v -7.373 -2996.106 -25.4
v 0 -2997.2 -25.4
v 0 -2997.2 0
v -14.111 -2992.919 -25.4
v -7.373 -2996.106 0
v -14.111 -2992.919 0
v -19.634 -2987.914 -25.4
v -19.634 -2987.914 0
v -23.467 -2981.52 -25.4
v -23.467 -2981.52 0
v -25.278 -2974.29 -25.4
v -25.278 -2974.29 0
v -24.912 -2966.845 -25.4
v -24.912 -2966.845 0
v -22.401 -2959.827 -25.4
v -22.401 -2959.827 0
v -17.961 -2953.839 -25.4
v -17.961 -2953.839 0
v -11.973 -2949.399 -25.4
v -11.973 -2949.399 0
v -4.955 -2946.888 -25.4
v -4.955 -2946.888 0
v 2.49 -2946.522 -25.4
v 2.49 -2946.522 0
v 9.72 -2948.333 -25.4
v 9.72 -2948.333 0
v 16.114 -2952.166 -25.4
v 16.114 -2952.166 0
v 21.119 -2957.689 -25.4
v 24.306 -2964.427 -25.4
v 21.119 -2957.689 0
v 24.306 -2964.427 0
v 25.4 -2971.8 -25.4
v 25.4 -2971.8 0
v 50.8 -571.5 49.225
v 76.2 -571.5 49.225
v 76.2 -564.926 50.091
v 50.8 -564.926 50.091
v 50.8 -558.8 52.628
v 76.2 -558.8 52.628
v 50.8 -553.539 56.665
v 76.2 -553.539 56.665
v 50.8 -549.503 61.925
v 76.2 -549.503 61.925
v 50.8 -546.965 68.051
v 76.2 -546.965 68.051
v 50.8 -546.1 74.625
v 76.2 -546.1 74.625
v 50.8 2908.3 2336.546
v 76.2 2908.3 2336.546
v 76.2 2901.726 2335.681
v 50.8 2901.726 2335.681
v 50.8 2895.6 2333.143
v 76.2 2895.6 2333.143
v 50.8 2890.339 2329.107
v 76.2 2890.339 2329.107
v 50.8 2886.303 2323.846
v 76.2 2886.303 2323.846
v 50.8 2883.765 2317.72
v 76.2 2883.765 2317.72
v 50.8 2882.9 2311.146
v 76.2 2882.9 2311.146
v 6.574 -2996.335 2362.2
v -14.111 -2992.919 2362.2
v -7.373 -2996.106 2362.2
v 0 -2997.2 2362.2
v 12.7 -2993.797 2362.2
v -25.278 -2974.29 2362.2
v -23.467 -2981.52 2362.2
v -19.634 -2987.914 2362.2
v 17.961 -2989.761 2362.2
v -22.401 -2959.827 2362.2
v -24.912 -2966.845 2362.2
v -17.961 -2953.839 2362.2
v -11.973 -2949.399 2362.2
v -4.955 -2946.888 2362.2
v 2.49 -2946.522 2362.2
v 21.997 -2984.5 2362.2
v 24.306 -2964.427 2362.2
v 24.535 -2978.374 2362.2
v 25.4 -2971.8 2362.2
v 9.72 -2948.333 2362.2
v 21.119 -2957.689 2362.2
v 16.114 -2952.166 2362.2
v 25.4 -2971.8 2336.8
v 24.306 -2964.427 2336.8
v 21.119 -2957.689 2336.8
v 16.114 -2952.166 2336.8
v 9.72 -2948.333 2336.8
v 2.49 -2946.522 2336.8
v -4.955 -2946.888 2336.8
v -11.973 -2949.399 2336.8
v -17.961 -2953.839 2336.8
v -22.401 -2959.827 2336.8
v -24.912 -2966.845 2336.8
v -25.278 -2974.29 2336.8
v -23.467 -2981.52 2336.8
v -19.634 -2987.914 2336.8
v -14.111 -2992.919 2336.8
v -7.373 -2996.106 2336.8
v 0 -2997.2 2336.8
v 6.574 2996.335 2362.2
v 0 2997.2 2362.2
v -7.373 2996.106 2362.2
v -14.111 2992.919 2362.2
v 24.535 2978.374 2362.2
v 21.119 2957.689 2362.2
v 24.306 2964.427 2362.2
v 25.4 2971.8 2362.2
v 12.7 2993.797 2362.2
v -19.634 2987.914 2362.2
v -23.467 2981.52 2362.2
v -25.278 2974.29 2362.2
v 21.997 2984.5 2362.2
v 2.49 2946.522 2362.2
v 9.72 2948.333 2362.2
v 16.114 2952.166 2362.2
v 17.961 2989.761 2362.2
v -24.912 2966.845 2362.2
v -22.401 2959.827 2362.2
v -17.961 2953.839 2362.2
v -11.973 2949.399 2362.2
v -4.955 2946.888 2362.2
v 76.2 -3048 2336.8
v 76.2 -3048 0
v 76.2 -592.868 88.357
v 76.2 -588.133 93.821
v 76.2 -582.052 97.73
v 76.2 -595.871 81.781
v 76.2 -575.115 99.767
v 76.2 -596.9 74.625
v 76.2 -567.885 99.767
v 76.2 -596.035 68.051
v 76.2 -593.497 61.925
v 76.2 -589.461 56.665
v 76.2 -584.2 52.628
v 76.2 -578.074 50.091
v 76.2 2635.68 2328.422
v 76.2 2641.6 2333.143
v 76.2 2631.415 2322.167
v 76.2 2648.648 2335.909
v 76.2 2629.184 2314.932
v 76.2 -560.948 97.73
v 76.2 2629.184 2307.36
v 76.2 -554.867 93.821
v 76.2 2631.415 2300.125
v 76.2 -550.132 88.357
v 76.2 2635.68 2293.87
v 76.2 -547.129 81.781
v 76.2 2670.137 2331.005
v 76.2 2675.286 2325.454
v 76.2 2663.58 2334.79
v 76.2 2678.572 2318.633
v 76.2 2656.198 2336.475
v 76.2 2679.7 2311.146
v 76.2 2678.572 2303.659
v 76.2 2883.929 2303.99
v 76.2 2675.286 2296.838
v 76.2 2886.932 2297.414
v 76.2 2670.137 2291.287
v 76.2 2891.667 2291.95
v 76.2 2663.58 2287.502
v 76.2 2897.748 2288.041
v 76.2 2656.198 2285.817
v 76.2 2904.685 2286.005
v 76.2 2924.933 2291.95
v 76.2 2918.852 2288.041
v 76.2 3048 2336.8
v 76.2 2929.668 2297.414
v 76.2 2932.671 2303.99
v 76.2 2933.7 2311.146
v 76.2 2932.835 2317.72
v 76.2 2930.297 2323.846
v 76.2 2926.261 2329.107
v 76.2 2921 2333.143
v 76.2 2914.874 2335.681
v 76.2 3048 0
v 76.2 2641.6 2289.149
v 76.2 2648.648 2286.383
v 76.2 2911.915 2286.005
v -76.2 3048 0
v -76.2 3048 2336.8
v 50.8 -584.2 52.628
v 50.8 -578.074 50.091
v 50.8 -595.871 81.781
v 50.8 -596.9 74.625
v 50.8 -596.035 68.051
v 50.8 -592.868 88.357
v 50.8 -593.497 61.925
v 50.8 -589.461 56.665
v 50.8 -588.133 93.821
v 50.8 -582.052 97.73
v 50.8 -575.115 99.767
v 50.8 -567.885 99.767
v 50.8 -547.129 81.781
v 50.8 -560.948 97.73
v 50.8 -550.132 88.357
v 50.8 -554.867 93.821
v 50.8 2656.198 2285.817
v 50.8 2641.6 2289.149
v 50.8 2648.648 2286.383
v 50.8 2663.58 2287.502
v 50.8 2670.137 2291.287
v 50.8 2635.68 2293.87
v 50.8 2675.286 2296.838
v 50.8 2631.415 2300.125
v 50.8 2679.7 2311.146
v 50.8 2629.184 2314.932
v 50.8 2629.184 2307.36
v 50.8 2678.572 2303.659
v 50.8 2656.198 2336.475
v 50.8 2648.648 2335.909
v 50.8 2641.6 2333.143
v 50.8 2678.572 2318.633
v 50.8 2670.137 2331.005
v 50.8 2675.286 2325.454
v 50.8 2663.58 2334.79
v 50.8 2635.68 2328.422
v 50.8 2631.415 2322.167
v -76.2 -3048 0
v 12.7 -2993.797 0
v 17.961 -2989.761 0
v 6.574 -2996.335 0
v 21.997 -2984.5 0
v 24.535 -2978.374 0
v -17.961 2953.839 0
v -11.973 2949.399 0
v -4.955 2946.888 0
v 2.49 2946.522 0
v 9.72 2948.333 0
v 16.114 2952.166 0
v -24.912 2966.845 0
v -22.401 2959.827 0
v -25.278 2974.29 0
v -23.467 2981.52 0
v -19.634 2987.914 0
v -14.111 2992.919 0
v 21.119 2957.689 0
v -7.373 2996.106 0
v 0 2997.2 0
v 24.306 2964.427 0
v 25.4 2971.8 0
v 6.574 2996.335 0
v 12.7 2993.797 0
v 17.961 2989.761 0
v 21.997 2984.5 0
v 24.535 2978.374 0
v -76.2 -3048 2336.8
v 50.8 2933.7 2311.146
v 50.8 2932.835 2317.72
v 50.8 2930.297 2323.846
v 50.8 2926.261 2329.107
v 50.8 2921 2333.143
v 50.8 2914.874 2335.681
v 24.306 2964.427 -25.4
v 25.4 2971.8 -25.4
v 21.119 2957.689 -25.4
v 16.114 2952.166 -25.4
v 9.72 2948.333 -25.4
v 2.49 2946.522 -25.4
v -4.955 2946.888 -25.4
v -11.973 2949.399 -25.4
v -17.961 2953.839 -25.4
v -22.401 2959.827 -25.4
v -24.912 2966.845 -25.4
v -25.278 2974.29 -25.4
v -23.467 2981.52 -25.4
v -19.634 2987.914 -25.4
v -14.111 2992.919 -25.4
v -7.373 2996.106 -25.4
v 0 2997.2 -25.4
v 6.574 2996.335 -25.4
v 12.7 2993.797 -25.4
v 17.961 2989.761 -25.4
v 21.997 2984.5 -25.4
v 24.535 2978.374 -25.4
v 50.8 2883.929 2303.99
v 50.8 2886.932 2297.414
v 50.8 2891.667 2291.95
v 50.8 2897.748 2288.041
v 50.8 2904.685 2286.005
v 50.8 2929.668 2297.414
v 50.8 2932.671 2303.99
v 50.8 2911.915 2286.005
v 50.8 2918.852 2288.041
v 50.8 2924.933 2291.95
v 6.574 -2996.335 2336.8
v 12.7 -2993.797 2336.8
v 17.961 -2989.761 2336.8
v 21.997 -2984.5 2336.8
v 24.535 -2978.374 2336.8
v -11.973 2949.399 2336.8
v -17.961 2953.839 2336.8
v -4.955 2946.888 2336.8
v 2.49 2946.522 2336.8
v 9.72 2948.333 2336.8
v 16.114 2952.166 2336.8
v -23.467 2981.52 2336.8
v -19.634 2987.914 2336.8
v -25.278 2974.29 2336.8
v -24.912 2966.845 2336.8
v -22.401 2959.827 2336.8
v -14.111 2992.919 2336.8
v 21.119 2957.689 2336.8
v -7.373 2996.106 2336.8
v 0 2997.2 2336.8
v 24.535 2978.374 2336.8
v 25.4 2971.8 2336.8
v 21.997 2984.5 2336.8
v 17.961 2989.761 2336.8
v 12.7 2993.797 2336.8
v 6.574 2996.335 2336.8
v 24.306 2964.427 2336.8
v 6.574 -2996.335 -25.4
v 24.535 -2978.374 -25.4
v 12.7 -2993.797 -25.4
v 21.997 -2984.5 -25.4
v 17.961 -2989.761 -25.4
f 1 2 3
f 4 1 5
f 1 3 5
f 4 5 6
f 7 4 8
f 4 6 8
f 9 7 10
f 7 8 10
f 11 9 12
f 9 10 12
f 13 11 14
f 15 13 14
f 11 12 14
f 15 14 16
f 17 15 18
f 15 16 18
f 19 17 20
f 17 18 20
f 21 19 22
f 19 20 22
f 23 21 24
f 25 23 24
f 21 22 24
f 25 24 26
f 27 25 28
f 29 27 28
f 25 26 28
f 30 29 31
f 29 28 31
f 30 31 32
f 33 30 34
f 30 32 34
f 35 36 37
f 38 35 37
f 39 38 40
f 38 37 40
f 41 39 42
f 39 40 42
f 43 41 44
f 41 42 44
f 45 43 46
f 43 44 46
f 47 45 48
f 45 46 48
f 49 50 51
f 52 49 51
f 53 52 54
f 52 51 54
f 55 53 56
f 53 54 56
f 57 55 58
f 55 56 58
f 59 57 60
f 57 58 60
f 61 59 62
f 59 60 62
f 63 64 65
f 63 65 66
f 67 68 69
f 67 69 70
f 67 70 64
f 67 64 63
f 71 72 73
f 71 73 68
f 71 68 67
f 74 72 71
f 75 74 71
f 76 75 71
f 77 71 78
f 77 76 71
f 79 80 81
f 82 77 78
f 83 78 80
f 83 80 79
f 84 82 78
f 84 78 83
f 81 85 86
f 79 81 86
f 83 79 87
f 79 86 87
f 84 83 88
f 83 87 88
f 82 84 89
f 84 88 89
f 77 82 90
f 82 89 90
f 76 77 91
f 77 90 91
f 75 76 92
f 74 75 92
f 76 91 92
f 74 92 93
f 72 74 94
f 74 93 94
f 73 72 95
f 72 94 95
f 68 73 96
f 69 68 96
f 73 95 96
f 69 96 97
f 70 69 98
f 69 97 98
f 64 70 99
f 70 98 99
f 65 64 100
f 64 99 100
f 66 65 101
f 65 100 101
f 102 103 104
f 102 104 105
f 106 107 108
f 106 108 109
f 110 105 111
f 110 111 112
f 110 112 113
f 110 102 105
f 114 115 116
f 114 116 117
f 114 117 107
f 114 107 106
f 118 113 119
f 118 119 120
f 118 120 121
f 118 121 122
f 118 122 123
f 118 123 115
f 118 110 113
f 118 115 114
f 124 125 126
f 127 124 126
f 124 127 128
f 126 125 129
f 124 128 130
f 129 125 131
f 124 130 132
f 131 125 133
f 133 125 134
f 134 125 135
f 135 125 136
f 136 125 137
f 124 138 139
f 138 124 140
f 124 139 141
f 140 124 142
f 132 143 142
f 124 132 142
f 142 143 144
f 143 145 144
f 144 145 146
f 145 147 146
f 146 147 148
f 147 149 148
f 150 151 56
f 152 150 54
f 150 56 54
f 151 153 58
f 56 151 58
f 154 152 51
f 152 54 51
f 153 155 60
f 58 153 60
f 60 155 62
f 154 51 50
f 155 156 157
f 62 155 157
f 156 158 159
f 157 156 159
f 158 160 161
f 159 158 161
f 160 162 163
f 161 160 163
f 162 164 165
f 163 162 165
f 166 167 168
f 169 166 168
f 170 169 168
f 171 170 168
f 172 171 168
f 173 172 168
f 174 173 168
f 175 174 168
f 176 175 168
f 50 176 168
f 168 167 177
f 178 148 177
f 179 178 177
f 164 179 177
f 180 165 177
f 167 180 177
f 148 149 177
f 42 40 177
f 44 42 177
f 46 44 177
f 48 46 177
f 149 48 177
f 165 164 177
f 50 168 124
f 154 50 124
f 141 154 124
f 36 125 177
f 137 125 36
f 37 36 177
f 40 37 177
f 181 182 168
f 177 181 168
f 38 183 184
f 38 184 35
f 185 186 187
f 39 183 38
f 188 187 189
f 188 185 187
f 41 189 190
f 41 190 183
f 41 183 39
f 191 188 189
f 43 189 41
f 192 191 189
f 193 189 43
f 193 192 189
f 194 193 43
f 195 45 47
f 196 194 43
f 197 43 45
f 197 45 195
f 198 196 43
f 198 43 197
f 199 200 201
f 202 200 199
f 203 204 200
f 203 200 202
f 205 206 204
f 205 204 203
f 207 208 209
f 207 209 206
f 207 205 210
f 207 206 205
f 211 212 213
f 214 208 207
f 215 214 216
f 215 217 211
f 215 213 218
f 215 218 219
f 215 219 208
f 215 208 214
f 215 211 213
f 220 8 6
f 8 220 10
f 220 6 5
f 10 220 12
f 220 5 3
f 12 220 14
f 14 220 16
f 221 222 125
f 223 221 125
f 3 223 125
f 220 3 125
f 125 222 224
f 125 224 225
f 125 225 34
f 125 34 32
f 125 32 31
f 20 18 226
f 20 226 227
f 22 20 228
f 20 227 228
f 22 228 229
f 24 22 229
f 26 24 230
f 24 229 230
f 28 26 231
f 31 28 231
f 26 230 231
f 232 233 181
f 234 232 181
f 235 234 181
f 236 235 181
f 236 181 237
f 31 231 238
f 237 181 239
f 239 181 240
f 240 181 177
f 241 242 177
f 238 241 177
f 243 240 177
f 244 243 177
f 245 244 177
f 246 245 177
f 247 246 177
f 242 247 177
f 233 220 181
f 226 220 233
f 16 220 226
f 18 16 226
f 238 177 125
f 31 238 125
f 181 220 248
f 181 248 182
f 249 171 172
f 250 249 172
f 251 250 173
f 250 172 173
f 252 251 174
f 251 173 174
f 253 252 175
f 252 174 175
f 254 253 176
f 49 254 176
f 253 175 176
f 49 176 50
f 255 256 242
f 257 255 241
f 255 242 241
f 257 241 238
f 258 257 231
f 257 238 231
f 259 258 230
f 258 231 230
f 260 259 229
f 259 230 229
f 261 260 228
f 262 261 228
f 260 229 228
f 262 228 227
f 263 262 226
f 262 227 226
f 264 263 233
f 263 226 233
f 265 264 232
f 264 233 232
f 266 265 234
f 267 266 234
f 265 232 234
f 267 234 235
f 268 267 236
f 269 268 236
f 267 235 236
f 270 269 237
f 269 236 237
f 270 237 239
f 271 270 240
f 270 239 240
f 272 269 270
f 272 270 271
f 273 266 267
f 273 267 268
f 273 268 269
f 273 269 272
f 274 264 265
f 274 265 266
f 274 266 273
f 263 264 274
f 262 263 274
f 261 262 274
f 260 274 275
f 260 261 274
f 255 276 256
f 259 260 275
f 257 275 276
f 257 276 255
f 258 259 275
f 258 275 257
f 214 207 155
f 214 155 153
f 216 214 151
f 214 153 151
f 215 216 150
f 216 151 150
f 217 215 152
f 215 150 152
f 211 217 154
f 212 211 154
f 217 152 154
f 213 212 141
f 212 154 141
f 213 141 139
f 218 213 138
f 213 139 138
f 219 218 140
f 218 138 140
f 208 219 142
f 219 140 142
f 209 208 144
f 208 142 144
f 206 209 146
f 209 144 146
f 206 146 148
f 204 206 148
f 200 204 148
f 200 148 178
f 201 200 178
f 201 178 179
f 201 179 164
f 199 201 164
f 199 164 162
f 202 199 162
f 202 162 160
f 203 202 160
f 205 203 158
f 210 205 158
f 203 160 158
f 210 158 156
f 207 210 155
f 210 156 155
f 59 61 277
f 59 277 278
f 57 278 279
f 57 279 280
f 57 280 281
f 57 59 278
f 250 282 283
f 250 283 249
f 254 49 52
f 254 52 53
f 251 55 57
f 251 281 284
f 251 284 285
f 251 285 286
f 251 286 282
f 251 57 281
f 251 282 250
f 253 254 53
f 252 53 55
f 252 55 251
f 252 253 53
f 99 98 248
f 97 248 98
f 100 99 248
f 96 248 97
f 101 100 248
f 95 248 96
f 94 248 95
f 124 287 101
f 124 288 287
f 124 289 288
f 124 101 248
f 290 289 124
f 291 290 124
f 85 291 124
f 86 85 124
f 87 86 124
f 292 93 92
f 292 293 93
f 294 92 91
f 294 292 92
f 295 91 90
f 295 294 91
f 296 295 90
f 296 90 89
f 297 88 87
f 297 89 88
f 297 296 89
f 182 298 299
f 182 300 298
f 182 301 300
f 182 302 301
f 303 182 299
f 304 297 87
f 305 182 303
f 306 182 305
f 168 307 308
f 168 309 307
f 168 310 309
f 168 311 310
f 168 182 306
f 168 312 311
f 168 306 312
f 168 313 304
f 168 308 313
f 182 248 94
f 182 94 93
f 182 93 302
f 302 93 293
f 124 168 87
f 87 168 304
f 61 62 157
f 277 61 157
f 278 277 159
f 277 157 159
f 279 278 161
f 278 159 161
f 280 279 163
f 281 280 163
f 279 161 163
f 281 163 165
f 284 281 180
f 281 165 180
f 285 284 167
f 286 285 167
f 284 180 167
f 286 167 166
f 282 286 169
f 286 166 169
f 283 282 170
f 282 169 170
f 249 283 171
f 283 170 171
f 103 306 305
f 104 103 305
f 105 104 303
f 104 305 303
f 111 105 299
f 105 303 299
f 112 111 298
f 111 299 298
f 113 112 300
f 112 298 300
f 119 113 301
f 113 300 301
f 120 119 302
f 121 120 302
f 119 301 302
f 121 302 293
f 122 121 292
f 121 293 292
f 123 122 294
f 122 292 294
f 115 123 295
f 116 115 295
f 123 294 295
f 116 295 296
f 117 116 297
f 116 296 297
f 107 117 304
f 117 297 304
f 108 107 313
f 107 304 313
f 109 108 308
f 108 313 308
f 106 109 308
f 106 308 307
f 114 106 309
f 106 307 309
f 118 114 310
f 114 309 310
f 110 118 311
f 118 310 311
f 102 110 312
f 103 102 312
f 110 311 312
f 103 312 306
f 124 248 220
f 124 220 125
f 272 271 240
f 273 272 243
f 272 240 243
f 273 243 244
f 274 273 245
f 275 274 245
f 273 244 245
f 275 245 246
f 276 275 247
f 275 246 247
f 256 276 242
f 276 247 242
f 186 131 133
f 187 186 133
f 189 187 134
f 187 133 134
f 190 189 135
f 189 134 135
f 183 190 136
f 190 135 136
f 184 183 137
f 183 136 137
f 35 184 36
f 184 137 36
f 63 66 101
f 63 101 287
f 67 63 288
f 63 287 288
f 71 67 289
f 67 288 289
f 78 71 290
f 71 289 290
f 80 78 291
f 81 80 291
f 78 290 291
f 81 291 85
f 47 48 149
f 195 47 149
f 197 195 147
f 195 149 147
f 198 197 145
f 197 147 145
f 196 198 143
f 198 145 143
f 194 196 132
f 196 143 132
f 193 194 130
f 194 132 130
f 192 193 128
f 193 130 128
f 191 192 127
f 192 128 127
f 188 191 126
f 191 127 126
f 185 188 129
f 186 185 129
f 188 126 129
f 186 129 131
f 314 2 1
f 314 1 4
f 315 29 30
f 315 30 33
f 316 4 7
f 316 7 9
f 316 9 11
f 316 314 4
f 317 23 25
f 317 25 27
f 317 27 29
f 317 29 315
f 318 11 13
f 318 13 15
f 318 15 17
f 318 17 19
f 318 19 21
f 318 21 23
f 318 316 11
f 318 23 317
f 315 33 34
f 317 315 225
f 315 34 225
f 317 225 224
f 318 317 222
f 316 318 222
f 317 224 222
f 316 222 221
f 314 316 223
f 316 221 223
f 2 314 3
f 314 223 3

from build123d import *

# Parameters (mm, degrees)
F0_W     = 152.4
F0_H     = 6096
F1_DEPTH = 2336.8
F3_DEPTH = 25.4
F5_DEPTH = 25.4
F6_R     = 25.4
F7_DEPTH = 25.4


with BuildPart() as f1:
    # F0 (on Top) → F1 (new body)
    with BuildSketch(Plane.XY):
        Rectangle(F0_W, F0_H)
    extrude(amount=F1_DEPTH)

    # F2 (on face) → F3 (join)
    with BuildSketch(Plane.XY.offset(2336.8)):
        with BuildLine():
            Line((0, 2971.8), (25.4, 2971.8))
            ThreePointArc((25.4, 2971.8), (17.9605122421, 2989.7605122421), (0, 2997.2))
            Line((0, 2997.2), (0, 2971.8))
        make_face()
        with BuildLine():
            ThreePointArc((0, 2997.2), (-17.9605122421, 2953.8394877579), (25.4, 2971.8))
            Line((25.4, 2971.8), (0, 2971.8))
            Line((0, 2971.8), (0, 2997.2))
        make_face()
        with BuildLine():
            ThreePointArc((25.4, -2971.8), (-17.9605122421, -2953.8394877579), (0, -2997.2))
            Line((0, -2997.2), (0, -2971.8))
            Line((0, -2971.8), (25.4, -2971.8))
        make_face()
        with BuildLine():
            Line((0, -2971.8), (0, -2997.2))
            ThreePointArc((0, -2997.2), (17.9605122421, -2989.7605122421), (25.4, -2971.8))
            Line((25.4, -2971.8), (0, -2971.8))
        make_face()
    extrude(amount=F3_DEPTH)

    # F4 (on face) → F5 (join)
    with BuildSketch(Plane(origin=(0, 0, 0), x_dir=(1, 0, 0), z_dir=(0, 0, -1))):
        with BuildLine():
            ThreePointArc((25.4, 2971.8), (17.9605122421, 2989.7605122421), (0, 2997.2))
            Line((0, 2997.2), (0, 2971.8))
            Line((0, 2971.8), (25.4, 2971.8))
        make_face()
        with BuildLine():
            Line((0, 2971.8), (0, 2997.2))
            ThreePointArc((0, 2997.2), (-17.9605122421, 2953.8394877579), (25.4, 2971.8))
            Line((25.4, 2971.8), (0, 2971.8))
        make_face()
        with BuildLine():
            ThreePointArc((0, -2997.2), (17.9605122421, -2989.7605122421), (25.4, -2971.8))
            Line((25.4, -2971.8), (0, -2971.8))
            Line((0, -2971.8), (0, -2997.2))
        make_face()
        with BuildLine():
            Line((0, -2971.8), (25.4, -2971.8))
            ThreePointArc((25.4, -2971.8), (-17.9605122421, -2953.8394877579), (0, -2997.2))
            Line((0, -2997.2), (0, -2971.8))
        make_face()
    extrude(amount=F5_DEPTH)

    # F6 (on face) → F7 (cut)
    with BuildSketch(Plane.YZ.offset(76.2)):
        with BuildLine():
            Line((-571.5, 74.6252), (-571.5, 49.2252))
            ThreePointArc((-571.5, 49.2252), (-553.5394877579, 56.6646877579), (-546.1, 74.6252))
            ThreePointArc((-546.1, 74.6252), (-571.5, 100.0252), (-596.9, 74.6252))
            Line((-596.9, 74.6252), (-571.5, 74.6252))
        make_face()
        with BuildLine():
            ThreePointArc((-596.9, 74.6252), (-589.4605122421, 56.6646877579), (-571.5, 49.2252))
            Line((-571.5, 49.2252), (-571.5, 74.6252))
            Line((-571.5, 74.6252), (-596.9, 74.6252))
        make_face()
        with BuildLine():
            Line((2908.3, 2311.146), (2933.7, 2311.146))
            ThreePointArc((2933.7, 2311.146), (2926.2605122421, 2329.1065122421), (2908.3, 2336.546))
            Line((2908.3, 2336.546), (2908.3, 2311.146))
        make_face()
        with BuildLine():
            Line((2908.3, 2311.146), (2908.3, 2336.546))
            ThreePointArc((2908.3, 2336.546), (2890.3394877579, 2329.1065122421), (2882.9, 2311.146))
            Line((2882.9, 2311.146), (2908.3, 2311.146))
        make_face()
        with BuildLine():
            ThreePointArc((2882.9, 2311.146), (2908.3, 2285.746), (2933.7, 2311.146))
            Line((2933.7, 2311.146), (2908.3, 2311.146))
            Line((2908.3, 2311.146), (2882.9, 2311.146))
        make_face()
        with Locations((2654.3, 2311.146)):
            Circle(F6_R)
    extrude(amount=-F7_DEPTH, mode=Mode.SUBTRACT)


solid = f1.part
